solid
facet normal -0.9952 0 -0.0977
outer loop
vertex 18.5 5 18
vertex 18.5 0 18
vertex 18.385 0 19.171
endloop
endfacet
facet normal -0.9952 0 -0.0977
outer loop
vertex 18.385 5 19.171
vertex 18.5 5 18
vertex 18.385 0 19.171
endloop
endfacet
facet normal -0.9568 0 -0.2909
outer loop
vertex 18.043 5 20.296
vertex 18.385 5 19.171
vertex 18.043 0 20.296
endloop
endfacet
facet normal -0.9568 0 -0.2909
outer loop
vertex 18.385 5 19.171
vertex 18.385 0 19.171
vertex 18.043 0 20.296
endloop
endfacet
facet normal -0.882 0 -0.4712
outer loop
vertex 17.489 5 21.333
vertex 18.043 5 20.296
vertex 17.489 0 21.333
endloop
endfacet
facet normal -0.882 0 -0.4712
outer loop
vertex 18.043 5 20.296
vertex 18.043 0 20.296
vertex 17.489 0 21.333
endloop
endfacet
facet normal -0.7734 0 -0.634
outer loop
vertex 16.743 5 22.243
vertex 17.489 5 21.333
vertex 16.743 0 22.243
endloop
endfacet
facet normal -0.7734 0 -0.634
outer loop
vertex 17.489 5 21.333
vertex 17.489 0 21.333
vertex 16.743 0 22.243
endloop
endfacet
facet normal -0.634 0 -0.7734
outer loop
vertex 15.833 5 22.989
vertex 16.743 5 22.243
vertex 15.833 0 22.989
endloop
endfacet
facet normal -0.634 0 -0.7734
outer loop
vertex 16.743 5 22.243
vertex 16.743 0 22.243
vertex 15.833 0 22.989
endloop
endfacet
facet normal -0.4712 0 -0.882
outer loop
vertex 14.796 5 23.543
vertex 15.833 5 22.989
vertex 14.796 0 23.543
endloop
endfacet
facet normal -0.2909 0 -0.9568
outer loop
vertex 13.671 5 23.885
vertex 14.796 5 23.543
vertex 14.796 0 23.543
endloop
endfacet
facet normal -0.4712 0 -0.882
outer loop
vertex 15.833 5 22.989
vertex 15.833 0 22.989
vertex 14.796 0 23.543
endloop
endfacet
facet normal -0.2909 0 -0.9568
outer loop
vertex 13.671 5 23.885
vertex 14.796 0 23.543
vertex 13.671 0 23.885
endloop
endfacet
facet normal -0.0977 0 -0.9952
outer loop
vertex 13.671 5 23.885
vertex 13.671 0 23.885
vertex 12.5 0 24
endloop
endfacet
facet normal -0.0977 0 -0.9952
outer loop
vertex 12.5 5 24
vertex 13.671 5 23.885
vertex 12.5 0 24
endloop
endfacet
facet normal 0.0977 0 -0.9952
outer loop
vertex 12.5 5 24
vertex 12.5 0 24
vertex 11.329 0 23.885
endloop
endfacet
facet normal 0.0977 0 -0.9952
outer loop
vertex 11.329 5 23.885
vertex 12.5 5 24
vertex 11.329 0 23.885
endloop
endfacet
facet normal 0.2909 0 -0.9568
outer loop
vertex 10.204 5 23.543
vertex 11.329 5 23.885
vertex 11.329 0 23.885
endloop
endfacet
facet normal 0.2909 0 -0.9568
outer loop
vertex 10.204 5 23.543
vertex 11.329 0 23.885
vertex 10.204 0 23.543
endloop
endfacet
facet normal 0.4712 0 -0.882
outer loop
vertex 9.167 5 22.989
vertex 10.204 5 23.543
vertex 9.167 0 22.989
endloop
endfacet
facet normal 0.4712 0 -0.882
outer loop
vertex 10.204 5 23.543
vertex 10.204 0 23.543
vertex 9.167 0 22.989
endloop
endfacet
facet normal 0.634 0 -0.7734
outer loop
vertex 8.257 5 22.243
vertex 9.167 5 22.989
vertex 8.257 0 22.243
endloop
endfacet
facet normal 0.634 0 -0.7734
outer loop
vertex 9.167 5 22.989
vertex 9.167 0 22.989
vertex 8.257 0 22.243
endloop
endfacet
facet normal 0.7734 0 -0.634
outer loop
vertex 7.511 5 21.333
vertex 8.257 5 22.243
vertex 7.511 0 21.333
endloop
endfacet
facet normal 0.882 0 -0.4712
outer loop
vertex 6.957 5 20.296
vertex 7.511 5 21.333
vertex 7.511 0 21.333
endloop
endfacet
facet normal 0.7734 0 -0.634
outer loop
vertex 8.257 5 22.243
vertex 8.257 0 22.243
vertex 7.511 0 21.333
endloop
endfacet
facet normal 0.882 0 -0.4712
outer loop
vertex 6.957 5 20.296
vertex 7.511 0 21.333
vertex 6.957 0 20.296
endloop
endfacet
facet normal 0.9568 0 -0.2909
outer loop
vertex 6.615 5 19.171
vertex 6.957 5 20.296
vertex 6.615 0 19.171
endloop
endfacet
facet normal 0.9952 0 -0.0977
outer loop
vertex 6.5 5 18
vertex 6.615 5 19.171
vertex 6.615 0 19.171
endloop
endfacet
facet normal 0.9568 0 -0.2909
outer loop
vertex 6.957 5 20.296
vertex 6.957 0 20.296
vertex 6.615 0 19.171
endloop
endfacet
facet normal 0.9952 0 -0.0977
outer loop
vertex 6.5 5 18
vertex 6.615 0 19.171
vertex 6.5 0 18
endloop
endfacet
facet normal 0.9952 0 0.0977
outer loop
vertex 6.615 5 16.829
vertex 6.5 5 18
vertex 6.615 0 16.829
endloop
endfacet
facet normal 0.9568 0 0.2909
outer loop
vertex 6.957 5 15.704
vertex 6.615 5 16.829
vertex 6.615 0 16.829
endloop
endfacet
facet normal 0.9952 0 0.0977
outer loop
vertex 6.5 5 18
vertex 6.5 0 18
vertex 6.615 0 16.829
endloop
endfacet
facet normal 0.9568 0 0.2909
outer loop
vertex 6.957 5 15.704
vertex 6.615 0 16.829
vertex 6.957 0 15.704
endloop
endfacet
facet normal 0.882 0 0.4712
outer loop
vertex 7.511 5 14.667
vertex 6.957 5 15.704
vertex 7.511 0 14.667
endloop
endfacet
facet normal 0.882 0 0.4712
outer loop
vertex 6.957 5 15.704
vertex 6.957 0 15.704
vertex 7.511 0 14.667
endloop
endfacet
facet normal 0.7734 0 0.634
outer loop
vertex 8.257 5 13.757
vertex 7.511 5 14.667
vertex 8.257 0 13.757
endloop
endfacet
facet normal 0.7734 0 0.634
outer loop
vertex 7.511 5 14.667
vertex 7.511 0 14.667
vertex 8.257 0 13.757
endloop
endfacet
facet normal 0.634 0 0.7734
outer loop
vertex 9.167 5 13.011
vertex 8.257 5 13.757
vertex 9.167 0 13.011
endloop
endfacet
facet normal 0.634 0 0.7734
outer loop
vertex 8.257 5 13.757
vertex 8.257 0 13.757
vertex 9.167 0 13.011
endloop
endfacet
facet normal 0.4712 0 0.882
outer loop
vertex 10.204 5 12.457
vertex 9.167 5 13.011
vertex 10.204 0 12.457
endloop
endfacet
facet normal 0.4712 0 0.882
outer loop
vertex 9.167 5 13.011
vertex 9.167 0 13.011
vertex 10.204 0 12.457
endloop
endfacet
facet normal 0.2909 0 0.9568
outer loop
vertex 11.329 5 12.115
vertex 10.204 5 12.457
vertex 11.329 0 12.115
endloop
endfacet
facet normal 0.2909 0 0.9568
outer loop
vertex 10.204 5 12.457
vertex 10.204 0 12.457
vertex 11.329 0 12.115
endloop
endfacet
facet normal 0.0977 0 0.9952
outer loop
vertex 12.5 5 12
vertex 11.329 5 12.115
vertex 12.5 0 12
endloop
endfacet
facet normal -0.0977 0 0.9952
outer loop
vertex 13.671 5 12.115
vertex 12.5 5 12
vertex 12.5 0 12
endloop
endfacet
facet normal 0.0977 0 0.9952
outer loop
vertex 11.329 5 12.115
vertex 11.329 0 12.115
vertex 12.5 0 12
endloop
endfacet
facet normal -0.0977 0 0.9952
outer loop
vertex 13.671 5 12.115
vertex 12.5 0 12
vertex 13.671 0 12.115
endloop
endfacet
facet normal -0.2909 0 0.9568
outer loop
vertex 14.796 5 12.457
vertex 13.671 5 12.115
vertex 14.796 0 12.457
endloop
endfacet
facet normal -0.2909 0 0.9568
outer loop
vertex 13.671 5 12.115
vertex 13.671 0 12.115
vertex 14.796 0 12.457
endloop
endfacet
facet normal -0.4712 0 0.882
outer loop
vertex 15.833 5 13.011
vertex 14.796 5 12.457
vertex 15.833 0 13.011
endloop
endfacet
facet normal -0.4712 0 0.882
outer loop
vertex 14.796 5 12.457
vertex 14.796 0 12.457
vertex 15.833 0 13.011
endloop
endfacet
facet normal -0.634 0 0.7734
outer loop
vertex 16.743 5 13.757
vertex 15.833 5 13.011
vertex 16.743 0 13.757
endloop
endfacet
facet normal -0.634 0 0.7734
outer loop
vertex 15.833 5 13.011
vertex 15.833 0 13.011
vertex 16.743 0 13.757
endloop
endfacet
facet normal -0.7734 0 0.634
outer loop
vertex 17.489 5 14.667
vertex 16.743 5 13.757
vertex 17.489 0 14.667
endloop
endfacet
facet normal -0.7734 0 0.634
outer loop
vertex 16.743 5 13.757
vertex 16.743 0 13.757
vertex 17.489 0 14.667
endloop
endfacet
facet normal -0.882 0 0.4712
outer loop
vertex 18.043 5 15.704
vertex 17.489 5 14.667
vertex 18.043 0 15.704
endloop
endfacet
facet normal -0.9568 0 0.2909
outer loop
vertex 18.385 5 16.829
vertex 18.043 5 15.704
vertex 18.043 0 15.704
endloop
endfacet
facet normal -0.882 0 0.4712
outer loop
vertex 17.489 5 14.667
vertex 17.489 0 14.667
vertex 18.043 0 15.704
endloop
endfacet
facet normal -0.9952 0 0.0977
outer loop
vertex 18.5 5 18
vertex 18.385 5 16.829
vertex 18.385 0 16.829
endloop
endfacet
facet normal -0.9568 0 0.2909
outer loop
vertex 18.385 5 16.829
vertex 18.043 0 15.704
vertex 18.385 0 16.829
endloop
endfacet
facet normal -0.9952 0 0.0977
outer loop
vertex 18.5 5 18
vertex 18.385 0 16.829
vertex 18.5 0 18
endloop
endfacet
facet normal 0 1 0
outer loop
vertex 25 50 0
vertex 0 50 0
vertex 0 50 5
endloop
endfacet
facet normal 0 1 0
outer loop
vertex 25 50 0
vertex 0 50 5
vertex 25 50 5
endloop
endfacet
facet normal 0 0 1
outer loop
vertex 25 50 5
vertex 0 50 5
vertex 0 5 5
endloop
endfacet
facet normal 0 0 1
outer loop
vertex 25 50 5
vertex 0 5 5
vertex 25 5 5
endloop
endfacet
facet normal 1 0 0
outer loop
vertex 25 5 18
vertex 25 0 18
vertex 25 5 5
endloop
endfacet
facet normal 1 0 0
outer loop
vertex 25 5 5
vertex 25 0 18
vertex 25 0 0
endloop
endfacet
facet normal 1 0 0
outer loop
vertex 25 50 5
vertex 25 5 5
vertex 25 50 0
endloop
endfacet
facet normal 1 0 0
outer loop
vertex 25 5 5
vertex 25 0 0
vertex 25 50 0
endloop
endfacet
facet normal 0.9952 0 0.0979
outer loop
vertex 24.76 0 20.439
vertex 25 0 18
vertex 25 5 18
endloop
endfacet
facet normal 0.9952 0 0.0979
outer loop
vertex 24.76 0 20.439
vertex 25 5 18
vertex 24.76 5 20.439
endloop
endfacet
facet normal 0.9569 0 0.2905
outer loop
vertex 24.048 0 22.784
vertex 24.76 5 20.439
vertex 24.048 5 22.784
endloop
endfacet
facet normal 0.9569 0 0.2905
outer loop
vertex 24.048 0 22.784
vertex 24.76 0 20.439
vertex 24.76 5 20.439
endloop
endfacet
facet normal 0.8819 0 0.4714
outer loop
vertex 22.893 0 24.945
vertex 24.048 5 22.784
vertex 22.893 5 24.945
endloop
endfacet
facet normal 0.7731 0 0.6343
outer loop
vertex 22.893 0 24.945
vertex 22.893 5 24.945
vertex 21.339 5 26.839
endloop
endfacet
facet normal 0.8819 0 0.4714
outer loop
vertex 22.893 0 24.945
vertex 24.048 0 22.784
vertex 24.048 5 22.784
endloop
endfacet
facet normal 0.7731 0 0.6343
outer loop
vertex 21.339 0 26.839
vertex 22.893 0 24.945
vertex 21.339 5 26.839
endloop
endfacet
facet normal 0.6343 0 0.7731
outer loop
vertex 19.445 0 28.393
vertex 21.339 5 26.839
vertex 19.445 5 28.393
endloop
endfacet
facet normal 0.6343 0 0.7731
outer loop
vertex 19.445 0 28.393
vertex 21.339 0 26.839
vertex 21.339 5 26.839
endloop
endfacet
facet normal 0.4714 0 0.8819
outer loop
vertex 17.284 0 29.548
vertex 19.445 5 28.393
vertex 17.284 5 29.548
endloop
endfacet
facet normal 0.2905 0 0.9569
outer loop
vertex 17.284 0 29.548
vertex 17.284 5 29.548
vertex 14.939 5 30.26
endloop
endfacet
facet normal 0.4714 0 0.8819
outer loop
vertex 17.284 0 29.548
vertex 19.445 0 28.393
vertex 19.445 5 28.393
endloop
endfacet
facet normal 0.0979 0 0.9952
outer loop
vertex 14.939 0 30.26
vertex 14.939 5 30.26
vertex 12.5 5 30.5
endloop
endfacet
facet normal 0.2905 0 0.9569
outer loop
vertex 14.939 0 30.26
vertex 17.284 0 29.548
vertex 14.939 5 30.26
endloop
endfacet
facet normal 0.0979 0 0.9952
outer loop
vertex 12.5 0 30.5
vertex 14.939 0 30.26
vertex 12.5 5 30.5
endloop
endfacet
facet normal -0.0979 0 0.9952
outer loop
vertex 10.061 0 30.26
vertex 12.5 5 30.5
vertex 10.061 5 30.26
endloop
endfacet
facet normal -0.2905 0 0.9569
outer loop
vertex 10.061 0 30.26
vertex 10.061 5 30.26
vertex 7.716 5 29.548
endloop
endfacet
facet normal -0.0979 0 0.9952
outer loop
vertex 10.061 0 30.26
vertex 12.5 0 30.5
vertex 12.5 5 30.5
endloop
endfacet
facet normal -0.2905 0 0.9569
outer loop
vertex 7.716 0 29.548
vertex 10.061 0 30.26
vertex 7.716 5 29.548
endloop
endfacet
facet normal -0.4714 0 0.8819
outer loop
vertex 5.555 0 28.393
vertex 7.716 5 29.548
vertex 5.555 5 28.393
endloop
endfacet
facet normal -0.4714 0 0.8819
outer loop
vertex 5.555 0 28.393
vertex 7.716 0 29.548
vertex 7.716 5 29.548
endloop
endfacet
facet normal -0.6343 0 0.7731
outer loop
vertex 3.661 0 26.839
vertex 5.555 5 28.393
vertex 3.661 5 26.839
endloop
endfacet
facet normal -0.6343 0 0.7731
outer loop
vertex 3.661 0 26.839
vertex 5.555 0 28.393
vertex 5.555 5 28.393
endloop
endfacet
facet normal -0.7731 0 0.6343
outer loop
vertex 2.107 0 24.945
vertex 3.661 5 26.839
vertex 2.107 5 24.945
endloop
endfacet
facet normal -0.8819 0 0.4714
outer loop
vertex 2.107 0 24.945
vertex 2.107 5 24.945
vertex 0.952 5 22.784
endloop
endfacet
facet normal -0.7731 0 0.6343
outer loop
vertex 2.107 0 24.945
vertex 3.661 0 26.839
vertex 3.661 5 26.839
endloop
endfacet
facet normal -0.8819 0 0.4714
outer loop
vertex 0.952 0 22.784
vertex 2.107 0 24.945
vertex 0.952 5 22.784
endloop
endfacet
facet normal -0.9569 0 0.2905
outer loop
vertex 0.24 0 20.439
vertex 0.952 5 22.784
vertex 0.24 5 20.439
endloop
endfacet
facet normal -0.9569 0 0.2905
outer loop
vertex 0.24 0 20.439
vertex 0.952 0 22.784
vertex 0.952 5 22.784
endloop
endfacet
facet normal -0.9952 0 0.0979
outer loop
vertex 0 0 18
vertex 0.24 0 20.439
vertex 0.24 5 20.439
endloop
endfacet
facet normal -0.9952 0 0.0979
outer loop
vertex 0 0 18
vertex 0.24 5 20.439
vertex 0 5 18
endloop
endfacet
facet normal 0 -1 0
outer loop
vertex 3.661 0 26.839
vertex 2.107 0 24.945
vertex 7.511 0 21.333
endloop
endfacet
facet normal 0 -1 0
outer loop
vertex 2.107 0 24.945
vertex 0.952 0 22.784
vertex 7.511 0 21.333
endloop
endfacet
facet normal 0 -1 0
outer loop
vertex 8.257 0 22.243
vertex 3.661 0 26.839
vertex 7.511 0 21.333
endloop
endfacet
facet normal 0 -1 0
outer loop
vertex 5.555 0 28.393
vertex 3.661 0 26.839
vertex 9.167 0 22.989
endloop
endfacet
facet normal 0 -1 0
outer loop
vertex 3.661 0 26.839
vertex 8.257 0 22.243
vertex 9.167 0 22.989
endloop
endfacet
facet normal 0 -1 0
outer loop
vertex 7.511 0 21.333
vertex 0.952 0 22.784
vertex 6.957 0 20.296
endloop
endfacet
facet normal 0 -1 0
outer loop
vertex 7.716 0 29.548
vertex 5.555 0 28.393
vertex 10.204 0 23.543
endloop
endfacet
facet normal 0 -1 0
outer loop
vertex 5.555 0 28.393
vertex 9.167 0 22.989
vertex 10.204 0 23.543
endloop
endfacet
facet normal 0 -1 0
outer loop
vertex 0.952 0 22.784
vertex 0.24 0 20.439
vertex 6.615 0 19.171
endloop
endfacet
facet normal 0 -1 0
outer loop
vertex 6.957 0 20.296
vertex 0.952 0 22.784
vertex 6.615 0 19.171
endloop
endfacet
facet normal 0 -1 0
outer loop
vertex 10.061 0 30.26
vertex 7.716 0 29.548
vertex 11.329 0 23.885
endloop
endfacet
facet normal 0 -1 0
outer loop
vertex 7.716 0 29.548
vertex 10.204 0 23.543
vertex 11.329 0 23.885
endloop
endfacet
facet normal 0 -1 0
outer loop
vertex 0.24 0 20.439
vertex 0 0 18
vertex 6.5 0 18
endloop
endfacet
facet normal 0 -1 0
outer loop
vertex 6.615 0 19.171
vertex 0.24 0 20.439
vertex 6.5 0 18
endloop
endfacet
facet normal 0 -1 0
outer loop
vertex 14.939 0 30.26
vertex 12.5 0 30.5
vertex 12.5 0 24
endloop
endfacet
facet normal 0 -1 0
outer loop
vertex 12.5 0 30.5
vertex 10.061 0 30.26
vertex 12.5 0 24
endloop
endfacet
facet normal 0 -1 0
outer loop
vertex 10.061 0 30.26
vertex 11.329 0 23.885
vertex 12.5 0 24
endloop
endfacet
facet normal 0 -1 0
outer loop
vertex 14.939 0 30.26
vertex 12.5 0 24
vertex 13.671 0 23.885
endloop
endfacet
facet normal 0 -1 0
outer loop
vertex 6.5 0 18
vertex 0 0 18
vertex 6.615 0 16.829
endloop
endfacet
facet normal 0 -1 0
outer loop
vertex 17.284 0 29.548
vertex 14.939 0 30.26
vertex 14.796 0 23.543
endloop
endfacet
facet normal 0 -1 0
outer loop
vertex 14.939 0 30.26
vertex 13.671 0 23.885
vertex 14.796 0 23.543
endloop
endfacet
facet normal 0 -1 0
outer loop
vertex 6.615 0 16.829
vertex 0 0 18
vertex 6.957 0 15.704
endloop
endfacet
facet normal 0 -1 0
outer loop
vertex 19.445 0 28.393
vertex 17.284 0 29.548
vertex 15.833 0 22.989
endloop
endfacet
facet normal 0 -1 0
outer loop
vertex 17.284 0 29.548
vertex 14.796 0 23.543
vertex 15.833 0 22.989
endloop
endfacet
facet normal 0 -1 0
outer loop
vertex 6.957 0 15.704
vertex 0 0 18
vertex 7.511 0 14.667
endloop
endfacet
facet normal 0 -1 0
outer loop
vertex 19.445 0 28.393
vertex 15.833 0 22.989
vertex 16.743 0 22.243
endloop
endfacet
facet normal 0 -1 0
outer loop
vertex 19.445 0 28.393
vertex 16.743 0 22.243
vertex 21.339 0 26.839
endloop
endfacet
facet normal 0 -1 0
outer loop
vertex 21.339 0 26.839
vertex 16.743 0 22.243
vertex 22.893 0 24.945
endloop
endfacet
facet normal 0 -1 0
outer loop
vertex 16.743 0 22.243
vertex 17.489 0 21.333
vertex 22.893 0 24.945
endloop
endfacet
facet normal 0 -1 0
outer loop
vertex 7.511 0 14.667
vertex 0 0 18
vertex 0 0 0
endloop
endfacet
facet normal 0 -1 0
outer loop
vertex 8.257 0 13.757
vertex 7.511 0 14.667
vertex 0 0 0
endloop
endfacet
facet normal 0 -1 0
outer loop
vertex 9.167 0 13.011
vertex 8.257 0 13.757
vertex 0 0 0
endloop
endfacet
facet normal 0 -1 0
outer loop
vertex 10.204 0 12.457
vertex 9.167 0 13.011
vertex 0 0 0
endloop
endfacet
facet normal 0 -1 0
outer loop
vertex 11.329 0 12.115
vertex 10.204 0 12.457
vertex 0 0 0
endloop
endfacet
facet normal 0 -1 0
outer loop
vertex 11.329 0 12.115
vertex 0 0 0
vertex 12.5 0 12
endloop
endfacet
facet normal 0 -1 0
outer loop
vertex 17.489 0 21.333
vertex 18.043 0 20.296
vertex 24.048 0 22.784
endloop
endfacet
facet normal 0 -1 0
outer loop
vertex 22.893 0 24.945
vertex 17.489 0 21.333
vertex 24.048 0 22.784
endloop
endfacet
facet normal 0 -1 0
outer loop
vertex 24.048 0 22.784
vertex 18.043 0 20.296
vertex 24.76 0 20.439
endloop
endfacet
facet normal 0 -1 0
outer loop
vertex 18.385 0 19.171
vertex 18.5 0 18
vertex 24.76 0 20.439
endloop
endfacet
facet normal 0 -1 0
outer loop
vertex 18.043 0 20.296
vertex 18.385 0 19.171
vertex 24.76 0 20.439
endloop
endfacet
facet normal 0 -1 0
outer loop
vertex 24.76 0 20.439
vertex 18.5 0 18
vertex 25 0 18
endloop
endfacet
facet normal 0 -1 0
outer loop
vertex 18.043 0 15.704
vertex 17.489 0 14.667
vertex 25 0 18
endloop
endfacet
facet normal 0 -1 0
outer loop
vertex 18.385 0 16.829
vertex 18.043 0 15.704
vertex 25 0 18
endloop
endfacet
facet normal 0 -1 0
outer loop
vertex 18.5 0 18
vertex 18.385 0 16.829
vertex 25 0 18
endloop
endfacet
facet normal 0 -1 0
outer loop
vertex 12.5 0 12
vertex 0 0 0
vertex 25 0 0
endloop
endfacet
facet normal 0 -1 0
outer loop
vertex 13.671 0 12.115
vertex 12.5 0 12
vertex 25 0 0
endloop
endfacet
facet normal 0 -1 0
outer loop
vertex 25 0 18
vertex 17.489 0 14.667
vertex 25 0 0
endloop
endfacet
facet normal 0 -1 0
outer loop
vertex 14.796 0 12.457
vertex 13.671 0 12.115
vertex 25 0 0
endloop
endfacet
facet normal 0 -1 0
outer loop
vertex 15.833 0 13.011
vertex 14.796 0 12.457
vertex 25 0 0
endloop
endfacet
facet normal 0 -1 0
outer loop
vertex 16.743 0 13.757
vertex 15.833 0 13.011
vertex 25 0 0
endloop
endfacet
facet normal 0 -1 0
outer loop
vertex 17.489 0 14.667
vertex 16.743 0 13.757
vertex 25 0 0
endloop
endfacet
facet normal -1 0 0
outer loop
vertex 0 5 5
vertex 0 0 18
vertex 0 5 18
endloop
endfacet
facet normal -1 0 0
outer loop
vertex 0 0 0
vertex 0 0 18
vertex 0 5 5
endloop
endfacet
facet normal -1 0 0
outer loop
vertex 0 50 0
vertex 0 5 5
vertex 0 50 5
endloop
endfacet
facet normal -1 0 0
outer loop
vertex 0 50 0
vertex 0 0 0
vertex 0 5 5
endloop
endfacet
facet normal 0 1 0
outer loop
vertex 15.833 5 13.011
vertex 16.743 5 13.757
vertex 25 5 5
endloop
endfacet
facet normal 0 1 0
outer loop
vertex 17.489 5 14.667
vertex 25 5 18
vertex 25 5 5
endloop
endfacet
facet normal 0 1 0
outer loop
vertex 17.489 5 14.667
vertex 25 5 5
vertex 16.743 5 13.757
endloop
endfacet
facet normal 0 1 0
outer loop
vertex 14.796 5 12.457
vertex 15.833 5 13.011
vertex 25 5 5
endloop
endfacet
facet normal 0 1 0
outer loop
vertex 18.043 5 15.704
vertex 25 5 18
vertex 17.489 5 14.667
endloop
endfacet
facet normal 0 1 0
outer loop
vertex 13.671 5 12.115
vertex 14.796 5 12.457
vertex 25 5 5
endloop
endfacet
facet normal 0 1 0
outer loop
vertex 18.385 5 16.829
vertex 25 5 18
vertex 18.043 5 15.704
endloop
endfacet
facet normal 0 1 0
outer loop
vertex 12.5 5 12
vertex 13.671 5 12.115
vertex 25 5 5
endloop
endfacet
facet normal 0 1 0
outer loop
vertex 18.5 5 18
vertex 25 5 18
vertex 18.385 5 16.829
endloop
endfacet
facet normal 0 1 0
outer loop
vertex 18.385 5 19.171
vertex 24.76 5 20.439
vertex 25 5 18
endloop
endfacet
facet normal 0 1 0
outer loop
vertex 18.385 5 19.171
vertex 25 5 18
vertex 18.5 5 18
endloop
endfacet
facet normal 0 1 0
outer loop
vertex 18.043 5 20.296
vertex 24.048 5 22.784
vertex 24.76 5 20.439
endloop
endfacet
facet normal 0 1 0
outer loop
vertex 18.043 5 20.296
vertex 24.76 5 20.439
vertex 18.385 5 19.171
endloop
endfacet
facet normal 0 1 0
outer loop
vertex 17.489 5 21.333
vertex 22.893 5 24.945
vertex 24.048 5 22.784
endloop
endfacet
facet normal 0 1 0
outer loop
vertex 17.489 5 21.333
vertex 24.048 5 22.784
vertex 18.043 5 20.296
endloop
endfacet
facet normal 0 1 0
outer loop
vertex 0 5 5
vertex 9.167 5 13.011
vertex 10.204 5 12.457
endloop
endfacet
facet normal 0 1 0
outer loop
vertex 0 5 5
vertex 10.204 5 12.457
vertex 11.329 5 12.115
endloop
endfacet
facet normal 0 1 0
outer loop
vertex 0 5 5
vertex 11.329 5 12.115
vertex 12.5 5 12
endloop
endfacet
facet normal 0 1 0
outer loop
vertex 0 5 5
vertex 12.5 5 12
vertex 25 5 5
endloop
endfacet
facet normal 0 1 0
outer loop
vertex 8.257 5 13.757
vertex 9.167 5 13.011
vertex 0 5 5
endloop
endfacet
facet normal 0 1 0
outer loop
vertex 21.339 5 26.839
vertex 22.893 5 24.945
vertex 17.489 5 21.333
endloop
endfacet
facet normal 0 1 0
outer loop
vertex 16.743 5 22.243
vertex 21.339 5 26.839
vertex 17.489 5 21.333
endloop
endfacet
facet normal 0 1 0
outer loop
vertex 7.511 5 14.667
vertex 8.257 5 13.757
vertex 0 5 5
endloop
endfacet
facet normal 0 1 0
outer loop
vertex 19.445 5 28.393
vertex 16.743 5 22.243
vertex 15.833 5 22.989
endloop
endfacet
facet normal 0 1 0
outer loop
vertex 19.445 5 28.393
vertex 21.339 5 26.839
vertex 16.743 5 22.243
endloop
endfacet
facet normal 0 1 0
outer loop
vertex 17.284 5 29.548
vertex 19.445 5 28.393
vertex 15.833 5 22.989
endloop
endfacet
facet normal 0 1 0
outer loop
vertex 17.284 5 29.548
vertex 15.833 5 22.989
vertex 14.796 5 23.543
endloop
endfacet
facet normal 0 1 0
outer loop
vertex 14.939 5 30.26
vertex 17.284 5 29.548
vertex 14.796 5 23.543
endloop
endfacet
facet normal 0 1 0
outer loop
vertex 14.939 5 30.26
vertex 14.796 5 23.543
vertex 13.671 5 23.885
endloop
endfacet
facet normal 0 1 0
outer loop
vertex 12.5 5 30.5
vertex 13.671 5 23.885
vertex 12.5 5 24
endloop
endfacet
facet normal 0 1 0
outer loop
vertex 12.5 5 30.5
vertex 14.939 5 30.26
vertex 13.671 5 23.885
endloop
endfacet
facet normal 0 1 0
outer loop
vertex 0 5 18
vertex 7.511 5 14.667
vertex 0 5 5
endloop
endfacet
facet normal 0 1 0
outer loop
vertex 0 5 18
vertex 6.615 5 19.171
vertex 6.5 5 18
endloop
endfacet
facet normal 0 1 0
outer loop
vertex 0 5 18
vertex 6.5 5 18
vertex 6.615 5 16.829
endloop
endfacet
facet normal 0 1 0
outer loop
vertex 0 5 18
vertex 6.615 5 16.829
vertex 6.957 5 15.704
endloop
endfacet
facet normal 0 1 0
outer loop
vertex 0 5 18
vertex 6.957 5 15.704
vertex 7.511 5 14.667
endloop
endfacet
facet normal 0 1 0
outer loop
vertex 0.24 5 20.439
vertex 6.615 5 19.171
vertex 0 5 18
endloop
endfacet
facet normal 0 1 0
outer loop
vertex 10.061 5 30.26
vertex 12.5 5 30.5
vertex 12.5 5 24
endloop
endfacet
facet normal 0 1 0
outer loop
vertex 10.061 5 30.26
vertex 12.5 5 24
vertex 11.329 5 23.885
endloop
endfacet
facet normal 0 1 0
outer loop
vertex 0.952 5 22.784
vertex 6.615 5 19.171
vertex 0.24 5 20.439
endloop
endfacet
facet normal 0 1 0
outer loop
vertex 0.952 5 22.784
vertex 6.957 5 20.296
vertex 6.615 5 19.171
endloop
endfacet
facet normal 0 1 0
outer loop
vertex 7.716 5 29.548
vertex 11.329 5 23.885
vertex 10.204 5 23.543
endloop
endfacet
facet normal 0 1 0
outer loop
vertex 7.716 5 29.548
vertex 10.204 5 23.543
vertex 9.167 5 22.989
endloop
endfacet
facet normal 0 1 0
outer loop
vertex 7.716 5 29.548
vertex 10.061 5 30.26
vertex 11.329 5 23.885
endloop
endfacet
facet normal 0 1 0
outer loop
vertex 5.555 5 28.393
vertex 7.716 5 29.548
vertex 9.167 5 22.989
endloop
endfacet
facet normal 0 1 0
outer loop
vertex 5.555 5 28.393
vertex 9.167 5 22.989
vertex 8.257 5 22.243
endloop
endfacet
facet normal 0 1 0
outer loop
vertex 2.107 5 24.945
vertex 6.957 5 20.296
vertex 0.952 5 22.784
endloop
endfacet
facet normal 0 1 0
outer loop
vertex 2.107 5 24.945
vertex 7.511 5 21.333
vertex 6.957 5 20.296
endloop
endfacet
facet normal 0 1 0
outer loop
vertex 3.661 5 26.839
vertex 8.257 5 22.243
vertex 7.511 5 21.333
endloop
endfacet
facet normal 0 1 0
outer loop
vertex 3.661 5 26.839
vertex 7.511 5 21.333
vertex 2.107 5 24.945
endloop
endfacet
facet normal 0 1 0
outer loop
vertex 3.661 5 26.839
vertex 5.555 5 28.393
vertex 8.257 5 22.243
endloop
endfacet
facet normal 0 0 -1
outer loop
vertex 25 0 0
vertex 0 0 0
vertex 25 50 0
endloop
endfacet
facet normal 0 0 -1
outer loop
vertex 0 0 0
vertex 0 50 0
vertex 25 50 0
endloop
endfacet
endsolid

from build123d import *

# Parameters (mm, degrees)
SKETCH_W     = 25
SKETCH_H     = 50
PAD_DEPTH    = 5
SKETCH001_R  = 6
PAD001_DEPTH = 5


with BuildPart() as part:
    # Sketch → Pad (new body)
    with BuildSketch(Plane.XY):
        with Locations((12.5, 25)):
            Rectangle(SKETCH_W, SKETCH_H)
    extrude(amount=PAD_DEPTH)

    # Sketch001 (on Face1 of Pad) → Pad001 (join)
    with BuildSketch(Plane.XZ):
        with BuildLine():
            Line((0, 0), (0, 18))
            ThreePointArc((25, 18), (12.5, 30.5), (0, 18))
            Line((25, 0), (25, 18))
            Line((0, 0), (25, 0))
        make_face()
        with Locations((12.5, 18)):
            Circle(SKETCH001_R, mode=Mode.SUBTRACT)
    extrude(amount=-PAD001_DEPTH)


solid = part.part
